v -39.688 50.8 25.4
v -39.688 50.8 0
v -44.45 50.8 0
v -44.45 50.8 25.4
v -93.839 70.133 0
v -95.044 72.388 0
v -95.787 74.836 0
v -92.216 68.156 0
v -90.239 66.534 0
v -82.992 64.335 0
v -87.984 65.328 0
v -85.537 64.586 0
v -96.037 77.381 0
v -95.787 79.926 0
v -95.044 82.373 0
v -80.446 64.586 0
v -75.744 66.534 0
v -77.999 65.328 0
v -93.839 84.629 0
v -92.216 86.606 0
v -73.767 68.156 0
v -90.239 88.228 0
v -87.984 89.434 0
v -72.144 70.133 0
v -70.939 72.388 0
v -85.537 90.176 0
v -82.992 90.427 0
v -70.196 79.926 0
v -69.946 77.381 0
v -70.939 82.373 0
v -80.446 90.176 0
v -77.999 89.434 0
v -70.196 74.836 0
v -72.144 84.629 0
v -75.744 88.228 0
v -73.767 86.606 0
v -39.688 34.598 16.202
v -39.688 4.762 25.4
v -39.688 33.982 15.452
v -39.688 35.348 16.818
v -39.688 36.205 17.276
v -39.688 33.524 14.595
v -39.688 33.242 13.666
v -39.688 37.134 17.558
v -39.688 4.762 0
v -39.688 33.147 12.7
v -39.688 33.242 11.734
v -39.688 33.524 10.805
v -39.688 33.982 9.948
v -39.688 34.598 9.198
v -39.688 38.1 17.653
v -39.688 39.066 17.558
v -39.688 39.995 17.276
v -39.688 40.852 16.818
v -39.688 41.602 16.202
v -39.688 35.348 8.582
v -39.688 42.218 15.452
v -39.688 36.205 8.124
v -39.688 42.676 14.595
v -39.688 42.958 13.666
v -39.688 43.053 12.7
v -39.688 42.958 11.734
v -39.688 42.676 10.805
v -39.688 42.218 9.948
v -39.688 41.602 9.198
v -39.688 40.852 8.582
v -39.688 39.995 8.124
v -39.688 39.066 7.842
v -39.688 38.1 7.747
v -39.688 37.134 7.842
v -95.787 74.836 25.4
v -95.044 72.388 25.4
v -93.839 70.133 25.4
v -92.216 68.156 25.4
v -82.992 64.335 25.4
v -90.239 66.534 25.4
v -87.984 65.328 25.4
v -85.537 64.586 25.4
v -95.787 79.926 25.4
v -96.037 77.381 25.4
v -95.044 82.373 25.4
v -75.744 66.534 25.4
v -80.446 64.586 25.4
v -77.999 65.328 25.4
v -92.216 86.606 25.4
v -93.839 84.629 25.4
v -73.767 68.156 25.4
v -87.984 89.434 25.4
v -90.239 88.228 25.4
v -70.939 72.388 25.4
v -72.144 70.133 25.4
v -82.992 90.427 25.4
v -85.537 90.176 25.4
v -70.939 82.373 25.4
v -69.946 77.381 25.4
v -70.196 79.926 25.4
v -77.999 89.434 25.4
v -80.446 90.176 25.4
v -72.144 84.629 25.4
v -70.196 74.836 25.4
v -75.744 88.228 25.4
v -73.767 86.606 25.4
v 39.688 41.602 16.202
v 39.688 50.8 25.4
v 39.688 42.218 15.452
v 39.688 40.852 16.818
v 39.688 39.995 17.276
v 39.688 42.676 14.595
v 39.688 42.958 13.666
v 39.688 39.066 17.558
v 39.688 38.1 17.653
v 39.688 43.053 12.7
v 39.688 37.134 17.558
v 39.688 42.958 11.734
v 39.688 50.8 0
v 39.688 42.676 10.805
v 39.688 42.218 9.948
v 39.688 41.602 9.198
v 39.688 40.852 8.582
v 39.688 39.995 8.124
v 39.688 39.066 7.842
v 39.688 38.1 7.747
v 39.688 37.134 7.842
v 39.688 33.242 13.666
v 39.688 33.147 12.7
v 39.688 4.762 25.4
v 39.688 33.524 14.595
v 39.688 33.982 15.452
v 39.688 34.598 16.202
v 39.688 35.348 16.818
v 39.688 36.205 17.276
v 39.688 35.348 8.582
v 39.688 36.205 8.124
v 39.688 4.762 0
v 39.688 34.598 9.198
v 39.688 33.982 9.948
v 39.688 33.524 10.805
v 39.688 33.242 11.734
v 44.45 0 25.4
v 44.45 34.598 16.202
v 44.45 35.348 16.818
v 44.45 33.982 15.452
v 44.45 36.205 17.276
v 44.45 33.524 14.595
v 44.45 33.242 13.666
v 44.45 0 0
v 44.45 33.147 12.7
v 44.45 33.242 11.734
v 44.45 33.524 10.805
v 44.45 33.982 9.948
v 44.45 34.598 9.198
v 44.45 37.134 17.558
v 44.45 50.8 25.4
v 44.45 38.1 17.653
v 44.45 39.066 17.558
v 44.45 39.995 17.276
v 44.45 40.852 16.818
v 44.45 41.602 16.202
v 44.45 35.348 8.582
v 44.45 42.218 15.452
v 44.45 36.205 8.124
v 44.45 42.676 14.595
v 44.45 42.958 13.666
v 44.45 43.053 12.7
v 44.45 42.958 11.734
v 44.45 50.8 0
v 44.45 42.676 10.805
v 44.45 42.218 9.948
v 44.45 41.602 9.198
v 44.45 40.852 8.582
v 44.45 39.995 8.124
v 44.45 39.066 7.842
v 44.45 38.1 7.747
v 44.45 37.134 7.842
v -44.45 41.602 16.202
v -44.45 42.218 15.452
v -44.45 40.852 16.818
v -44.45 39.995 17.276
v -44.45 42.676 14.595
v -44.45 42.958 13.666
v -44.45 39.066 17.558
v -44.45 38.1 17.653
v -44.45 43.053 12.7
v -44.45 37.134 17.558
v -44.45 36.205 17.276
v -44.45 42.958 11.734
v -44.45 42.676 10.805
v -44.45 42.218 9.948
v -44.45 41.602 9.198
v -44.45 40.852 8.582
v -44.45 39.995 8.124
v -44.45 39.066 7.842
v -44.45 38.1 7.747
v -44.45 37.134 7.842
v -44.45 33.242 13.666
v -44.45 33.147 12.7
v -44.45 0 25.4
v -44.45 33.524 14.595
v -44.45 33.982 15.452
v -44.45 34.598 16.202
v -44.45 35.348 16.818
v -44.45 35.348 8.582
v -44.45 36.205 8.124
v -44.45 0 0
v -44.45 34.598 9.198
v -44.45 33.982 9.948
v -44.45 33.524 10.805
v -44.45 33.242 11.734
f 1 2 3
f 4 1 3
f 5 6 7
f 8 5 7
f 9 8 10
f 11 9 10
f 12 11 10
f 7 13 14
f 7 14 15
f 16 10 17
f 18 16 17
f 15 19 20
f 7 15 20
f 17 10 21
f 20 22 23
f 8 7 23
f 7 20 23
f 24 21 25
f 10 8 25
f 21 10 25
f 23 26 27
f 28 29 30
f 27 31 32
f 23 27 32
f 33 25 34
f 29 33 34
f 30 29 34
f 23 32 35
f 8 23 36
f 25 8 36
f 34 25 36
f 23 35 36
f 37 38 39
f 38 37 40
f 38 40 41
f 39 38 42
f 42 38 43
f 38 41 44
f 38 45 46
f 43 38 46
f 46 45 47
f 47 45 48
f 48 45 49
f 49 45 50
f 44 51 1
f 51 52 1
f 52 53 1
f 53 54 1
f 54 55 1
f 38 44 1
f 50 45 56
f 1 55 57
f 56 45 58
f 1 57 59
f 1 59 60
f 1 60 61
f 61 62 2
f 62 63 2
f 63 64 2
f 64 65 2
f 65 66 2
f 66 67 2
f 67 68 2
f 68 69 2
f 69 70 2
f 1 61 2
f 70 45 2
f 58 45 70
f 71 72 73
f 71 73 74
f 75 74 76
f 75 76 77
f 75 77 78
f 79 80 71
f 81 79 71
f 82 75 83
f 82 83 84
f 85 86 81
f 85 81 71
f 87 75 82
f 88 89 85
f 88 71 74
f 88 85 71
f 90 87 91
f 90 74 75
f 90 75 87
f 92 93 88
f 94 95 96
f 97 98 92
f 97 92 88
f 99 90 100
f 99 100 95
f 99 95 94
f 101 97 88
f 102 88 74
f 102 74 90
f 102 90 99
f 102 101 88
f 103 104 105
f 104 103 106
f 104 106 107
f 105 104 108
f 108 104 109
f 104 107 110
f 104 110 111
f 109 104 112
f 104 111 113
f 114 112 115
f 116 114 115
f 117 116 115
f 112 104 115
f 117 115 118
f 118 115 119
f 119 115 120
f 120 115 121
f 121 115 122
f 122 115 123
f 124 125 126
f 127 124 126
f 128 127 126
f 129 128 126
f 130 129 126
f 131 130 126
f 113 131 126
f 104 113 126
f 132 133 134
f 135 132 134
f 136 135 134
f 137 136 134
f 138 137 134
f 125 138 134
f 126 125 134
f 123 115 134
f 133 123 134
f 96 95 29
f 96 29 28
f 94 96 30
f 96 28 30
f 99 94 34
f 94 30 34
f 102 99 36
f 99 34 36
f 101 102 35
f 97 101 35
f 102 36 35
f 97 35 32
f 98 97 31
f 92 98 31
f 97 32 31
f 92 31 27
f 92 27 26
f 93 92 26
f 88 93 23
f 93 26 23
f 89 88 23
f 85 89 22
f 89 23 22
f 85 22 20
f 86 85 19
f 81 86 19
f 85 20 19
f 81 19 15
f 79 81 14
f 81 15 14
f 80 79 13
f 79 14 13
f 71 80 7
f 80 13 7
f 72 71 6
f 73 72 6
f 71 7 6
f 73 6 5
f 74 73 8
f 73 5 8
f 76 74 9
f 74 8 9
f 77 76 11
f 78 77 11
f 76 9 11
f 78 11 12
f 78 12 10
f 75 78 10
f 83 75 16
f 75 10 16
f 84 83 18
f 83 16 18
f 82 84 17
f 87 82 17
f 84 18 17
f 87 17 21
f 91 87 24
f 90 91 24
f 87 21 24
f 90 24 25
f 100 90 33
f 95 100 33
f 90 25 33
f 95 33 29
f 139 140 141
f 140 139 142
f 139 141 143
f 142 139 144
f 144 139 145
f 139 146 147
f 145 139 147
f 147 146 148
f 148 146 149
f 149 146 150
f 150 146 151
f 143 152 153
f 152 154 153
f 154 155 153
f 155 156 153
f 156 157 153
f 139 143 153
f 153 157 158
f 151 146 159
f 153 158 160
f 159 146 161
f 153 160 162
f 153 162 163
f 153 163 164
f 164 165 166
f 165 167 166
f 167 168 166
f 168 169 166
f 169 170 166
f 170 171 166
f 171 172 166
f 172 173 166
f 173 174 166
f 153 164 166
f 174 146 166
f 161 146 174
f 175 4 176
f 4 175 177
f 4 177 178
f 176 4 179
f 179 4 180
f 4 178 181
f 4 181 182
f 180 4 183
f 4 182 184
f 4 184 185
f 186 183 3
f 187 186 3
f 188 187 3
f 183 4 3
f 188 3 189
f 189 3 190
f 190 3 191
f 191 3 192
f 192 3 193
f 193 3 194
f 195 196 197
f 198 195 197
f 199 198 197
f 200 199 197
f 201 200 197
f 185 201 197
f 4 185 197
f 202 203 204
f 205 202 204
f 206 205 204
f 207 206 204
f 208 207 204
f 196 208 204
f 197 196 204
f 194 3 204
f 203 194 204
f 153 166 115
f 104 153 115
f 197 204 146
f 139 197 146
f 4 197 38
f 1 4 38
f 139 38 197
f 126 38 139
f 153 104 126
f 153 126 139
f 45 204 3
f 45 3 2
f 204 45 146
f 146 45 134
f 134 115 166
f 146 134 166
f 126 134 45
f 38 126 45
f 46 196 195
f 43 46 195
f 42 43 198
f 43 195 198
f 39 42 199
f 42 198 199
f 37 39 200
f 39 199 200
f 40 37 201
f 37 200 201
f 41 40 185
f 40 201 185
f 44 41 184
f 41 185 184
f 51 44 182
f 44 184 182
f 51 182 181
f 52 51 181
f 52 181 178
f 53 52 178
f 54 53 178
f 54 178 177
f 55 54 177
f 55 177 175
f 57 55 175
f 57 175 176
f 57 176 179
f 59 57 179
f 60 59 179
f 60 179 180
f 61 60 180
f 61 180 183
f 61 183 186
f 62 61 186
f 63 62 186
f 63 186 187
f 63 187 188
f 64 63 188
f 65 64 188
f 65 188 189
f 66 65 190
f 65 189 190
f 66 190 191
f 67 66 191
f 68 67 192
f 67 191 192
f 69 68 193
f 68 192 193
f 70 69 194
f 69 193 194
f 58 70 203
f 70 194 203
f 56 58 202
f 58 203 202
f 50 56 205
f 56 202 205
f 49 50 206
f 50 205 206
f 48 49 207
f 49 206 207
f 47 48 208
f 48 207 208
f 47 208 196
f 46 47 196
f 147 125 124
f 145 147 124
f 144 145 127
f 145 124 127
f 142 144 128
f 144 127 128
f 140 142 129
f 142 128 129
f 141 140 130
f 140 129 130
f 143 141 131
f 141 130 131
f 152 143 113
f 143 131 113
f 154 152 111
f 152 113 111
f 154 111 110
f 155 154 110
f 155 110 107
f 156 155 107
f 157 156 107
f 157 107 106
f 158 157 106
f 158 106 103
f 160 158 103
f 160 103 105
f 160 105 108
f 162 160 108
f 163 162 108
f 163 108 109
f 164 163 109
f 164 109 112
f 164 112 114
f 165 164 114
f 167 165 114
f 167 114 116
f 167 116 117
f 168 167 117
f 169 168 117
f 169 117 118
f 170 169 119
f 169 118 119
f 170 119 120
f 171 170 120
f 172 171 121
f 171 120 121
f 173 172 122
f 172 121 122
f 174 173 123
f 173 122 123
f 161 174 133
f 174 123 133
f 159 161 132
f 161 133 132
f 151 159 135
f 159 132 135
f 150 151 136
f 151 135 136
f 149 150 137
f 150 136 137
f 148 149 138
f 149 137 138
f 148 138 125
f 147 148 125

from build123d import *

# Parameters (mm, degrees)
F1_DEPTH = 25.4
F2_R     = 4.953
F3_DEPTH = 88.901
F4_R     = 13.045799
F5_DEPTH = 25.4


with BuildPart() as f1:
    # F0 (on Top) → F1 (new body)
    with BuildSketch(Plane.XY):
        Polygon((-44.45, 0), (44.45, 0), (44.45, 50.8), (39.6875, 50.8), (39.6875, 4.7625), (-39.6875, 4.7625), (-39.6875, 50.8), (-44.45, 50.8), align=None)
    extrude(amount=F1_DEPTH)

    # F2 (on face) → F3 (cut, through all)
    with BuildSketch(Plane(origin=(-44.45, 0, 0), x_dir=(0, -1, 0), z_dir=(-1, 0, 0))):
        with Locations((-38.1, 12.7)):
            Circle(F2_R)
    extrude(amount=-F3_DEPTH, mode=Mode.SUBTRACT)


with BuildPart() as f5:
    # F4 (on Top) → F5 (new body)
    with BuildSketch(Plane.XY):
        with Locations((-82.991563, 77.380843)):
            Circle(F4_R)
    extrude(amount=F5_DEPTH)


solid = Compound([f1.part, f5.part])
